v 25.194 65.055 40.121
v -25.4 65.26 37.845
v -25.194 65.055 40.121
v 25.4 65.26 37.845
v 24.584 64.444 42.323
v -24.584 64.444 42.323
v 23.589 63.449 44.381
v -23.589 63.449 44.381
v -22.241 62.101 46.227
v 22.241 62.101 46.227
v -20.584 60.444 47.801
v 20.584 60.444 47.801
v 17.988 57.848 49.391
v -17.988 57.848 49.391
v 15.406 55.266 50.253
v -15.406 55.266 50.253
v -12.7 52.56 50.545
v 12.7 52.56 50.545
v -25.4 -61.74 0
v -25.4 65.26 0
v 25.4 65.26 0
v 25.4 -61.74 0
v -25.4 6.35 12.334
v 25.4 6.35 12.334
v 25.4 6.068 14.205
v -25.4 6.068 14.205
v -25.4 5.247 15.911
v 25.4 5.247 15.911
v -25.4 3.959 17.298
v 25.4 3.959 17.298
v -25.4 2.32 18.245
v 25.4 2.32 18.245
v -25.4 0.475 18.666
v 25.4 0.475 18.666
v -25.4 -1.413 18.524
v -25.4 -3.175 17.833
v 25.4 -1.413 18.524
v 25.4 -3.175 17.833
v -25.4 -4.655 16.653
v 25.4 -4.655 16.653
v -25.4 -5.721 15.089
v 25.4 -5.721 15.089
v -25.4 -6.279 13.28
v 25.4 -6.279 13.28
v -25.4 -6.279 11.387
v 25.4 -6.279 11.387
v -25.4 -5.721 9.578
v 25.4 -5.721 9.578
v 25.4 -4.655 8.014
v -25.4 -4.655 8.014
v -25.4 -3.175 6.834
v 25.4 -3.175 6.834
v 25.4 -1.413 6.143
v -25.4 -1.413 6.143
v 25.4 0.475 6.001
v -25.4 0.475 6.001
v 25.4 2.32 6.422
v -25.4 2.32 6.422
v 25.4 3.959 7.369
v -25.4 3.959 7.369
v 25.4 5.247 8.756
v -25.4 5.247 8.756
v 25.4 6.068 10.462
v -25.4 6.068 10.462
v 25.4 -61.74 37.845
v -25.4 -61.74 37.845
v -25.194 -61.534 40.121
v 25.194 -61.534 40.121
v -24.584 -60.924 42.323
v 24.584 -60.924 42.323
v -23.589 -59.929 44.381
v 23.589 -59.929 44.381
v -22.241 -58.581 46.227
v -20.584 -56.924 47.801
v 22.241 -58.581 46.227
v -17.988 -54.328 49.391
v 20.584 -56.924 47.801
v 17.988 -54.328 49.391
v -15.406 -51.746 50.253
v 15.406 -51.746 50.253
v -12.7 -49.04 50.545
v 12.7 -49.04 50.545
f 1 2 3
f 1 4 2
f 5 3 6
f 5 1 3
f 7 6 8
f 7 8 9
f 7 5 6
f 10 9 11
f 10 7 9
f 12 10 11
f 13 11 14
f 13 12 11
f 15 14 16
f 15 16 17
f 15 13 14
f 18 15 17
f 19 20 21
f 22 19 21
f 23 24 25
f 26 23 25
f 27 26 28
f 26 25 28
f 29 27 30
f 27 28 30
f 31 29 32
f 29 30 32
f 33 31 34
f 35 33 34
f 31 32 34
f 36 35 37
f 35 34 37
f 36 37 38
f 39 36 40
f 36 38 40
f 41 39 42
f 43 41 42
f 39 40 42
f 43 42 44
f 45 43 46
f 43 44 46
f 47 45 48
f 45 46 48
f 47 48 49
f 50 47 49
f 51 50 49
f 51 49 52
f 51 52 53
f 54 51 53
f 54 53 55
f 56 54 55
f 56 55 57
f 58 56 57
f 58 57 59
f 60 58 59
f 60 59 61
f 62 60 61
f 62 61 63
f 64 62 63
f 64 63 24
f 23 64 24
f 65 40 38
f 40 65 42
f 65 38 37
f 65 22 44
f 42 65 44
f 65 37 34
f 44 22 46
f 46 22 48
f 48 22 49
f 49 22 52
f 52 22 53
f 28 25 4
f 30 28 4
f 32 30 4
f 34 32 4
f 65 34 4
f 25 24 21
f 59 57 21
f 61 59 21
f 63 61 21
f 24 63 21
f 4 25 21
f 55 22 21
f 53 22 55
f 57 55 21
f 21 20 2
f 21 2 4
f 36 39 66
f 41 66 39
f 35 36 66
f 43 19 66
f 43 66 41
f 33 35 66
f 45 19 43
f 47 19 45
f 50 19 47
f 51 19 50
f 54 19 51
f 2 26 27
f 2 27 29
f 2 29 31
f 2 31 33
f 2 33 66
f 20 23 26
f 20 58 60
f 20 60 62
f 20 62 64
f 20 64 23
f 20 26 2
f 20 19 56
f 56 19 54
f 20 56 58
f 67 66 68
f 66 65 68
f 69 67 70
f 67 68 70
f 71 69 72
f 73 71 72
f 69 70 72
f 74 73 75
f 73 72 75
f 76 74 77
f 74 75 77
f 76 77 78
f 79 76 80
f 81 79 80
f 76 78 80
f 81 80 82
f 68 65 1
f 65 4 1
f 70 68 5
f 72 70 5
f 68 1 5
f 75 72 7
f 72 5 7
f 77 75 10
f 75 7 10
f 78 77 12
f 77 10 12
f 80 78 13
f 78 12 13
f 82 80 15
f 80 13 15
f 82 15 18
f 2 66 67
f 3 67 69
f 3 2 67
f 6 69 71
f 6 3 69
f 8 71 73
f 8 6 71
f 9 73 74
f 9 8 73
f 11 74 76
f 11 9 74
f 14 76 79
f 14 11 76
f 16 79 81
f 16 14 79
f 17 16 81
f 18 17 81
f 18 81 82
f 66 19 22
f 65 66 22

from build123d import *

# Parameters (mm, degrees)
F0_W     = 50.8
F0_H     = 127
F1_DEPTH = 50.544538
F2_R     = 12.7
F3_R     = 6.35
F4_DEPTH = 105.582835


with BuildPart() as f1:
    # F0 (on Top) → F1 (new body)
    with BuildSketch(Plane.XY):
        with Locations((0, 1.760196)):
            Rectangle(F0_W, F0_H)
    extrude(amount=F1_DEPTH)

    # F2
    f2_edges = [f1.edges().sort_by_distance(p)[0] for p in [
        (25.4, 1.760196, 50.544538),
        (0, -61.739804, 50.544538),
        (-25.4, 1.760196, 50.544538),
        (0, 65.260196, 50.544538),
    ]]
    fillet(f2_edges, radius=F2_R)

    # F3 (on face) → F4 (cut)
    with BuildSketch(Plane.YZ.offset(25.4)):
        with Locations((0, 12.333511)):
            Circle(F3_R)
    extrude(amount=-F4_DEPTH, mode=Mode.SUBTRACT)


solid = f1.part
